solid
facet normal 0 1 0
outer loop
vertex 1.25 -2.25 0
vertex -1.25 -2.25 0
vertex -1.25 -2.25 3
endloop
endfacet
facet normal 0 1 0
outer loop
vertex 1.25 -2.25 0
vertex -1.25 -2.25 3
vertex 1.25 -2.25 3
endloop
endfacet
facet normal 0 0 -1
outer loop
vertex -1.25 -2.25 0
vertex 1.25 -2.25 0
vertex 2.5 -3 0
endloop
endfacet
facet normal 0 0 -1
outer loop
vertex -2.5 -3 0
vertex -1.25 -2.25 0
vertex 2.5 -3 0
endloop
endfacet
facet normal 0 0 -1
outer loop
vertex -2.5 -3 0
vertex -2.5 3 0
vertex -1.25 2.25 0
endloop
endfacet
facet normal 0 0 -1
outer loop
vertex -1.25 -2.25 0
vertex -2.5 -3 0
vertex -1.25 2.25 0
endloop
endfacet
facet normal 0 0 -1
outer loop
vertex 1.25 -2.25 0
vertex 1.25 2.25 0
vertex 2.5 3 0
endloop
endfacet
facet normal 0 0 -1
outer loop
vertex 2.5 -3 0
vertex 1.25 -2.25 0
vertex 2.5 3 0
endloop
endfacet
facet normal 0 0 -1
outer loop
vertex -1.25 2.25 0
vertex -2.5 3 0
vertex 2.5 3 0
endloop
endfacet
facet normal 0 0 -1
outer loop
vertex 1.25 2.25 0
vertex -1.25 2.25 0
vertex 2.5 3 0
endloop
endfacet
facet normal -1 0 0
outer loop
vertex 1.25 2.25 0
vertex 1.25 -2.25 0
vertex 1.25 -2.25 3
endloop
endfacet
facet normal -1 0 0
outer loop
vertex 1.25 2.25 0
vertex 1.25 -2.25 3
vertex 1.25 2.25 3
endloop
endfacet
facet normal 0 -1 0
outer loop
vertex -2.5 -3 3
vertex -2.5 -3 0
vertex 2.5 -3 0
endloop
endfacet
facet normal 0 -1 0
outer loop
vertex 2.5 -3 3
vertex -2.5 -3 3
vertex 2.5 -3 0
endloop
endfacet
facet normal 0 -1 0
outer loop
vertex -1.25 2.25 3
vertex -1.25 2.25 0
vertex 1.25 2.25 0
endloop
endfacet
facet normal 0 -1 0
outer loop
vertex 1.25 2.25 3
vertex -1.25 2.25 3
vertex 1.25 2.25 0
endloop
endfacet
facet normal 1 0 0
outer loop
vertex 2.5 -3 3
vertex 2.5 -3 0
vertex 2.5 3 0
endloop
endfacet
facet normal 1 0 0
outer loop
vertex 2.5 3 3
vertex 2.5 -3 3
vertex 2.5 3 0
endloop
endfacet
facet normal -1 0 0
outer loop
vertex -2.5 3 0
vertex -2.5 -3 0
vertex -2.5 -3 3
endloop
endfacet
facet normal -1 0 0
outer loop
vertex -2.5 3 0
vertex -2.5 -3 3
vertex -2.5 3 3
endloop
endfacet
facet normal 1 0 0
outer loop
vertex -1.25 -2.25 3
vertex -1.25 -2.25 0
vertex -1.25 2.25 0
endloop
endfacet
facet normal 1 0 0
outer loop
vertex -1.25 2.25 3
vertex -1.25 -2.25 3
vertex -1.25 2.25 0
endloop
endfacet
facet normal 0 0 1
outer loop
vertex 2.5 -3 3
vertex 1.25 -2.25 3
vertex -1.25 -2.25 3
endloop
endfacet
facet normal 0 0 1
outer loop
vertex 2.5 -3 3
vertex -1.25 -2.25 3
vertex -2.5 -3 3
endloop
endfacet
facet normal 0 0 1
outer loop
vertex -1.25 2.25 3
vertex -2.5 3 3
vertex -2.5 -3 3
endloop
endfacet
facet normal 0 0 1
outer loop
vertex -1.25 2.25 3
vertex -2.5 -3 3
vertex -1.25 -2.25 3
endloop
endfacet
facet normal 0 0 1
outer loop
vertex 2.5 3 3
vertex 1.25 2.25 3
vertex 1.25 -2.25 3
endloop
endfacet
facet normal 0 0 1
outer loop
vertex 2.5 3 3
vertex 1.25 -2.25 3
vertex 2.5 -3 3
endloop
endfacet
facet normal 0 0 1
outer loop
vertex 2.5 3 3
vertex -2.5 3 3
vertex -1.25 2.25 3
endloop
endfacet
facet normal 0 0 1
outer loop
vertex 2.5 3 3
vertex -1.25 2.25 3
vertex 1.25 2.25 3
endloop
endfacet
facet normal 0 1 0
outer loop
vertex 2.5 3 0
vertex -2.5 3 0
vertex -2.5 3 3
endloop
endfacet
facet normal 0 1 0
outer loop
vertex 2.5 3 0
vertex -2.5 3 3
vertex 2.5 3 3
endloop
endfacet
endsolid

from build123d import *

# Parameters (mm, degrees)
F0_W     = 5
F0_H     = 6
F0_W_2   = 2.5
F0_H_2   = 4.5
F1_DEPTH = 3


with BuildPart() as f1:
    # F0 (on Top) → F1 (new body)
    with BuildSketch(Plane.XY):
        Rectangle(F0_W, F0_H)
        Rectangle(F0_W_2, F0_H_2, mode=Mode.SUBTRACT)
    extrude(amount=F1_DEPTH)


solid = f1.part
